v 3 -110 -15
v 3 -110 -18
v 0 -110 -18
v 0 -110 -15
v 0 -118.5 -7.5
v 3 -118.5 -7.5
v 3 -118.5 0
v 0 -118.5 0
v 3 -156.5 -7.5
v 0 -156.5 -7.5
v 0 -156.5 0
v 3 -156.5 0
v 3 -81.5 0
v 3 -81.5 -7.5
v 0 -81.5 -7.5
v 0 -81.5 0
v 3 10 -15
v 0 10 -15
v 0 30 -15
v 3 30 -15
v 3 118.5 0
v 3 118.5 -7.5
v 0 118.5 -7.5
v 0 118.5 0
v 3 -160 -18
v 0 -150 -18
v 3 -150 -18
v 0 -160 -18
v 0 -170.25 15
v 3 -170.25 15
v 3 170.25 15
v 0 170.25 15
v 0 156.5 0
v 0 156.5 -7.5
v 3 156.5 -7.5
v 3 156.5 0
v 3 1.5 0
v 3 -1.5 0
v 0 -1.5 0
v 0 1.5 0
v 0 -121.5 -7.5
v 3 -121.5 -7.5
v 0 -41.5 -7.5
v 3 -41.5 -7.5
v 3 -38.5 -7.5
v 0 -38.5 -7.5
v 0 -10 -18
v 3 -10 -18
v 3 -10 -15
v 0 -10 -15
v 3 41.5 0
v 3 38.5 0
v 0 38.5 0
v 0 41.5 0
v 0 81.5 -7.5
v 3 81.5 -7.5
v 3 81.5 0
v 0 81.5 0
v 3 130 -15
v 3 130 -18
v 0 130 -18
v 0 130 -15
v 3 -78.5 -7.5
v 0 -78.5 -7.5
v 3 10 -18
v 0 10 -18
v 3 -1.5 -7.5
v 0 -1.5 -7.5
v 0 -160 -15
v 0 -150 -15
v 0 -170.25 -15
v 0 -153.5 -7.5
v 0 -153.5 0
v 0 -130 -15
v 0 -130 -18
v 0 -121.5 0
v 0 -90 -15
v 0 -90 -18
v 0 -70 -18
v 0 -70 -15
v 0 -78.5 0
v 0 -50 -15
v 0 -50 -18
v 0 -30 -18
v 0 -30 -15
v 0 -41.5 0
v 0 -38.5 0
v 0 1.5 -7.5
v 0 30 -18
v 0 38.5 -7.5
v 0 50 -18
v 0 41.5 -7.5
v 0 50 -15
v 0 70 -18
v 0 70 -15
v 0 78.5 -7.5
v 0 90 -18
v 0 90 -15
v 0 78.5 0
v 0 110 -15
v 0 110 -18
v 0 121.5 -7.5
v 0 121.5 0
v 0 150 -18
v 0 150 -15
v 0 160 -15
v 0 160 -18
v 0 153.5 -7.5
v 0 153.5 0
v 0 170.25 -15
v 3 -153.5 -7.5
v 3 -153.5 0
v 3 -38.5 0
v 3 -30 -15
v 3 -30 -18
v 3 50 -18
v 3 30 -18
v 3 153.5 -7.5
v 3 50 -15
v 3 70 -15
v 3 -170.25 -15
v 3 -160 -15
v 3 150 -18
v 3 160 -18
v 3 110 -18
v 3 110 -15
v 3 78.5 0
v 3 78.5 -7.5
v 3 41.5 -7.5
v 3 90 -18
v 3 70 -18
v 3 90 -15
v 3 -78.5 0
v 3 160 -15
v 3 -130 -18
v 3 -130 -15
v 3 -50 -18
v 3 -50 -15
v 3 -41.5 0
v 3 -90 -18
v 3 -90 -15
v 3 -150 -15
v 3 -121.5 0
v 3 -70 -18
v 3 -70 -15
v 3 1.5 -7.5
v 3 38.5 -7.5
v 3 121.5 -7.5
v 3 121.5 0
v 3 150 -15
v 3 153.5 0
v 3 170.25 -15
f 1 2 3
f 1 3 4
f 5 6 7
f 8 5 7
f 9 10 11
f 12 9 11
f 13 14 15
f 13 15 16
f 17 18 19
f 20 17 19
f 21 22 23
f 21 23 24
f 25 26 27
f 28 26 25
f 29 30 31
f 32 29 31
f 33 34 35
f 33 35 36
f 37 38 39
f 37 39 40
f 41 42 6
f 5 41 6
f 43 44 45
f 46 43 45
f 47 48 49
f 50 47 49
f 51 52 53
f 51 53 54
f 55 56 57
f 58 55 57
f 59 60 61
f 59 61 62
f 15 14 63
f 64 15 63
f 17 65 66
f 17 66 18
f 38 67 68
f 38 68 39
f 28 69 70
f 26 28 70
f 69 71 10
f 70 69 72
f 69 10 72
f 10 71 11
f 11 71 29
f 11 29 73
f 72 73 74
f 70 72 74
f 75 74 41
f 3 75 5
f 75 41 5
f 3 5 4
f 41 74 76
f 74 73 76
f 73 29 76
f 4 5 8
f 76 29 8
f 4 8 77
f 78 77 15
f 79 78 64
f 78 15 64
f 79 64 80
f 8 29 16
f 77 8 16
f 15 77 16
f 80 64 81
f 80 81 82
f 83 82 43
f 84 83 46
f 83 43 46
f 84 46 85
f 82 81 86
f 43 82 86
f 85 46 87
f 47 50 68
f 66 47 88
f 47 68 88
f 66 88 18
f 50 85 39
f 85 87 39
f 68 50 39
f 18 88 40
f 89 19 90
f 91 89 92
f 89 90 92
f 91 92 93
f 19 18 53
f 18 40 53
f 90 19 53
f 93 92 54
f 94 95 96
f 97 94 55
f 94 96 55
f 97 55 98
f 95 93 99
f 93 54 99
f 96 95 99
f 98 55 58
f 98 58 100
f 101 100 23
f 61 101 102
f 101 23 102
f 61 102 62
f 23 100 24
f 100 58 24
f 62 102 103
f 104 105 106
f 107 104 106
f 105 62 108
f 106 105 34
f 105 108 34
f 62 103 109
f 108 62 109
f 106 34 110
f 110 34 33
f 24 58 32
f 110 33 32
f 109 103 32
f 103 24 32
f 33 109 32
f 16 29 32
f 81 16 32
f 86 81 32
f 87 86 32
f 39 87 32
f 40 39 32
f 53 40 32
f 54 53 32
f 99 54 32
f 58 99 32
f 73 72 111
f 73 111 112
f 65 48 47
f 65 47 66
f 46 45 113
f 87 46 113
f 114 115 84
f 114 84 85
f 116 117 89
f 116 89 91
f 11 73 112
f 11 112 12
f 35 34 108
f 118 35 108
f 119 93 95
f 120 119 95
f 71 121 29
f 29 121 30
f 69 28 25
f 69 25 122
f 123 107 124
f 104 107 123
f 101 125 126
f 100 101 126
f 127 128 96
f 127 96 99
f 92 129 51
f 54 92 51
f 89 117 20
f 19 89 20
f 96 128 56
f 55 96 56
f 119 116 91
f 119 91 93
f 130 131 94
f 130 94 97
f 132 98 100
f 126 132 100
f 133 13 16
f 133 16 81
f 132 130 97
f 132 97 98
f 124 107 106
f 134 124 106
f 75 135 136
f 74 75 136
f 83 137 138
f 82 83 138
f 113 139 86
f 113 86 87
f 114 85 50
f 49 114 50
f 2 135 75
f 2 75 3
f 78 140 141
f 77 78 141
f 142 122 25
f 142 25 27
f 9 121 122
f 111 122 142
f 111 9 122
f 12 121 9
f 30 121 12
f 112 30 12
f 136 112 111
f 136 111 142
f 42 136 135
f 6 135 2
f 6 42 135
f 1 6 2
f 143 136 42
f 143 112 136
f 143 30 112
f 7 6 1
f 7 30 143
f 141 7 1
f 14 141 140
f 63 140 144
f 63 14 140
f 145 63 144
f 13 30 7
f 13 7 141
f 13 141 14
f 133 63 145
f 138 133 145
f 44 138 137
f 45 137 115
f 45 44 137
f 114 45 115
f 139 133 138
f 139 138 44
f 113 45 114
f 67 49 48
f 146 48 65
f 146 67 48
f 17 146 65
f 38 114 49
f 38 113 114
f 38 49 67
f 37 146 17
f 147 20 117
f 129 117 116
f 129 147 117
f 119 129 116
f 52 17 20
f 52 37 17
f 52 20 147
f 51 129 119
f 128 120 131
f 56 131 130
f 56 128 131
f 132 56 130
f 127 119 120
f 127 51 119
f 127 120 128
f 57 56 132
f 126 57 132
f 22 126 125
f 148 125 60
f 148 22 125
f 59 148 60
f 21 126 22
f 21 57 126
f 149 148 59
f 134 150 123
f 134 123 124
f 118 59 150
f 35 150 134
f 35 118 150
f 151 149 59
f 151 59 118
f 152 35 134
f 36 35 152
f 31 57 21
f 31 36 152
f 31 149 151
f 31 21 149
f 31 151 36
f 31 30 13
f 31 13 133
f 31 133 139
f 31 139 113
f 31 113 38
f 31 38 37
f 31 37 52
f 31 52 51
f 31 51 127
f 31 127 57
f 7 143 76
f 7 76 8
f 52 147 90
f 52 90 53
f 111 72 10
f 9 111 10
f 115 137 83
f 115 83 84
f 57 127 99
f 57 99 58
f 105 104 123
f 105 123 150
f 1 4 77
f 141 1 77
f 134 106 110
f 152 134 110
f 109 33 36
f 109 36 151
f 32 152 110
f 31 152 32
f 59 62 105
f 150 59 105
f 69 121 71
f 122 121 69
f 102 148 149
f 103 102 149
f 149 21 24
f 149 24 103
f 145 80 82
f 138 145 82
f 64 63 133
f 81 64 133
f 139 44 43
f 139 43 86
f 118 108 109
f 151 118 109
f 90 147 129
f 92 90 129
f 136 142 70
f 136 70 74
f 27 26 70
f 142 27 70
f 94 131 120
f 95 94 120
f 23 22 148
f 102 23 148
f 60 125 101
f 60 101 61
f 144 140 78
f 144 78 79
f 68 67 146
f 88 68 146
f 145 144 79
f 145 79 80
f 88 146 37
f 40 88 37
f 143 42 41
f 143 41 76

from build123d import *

# Parameters (mm, degrees)
F0_W      = 280
F0_H      = 30
F1_DEPTH  = 3
F2_W      = 20
F2_H      = 3
F3_DEPTH  = 3
F4_W      = 3
F4_H      = 7.5
F5_DEPTH  = 25
F6_W      = 30.25
F6_H      = 30
F7_DEPTH  = 3
F8_W      = 10
F8_H      = 3
F9_DEPTH  = 3
F10_W     = 3
F10_H     = 7.5
F11_DEPTH = 25


with BuildPart() as f1:
    # F0 (on Right) → F1 (new body)
    with BuildSketch(Plane.YZ):
        Rectangle(F0_W, F0_H)
    extrude(amount=F1_DEPTH)

    # F2 (on face) → F3 (join, through all)
    with BuildSketch(Plane.YZ.offset(3)):
        with Locations((120, -16.5)):
            Rectangle(F2_W, F2_H)
        with Locations((80, -16.5)):
            Rectangle(F2_W, F2_H)
        with Locations((40, -16.5)):
            Rectangle(F2_W, F2_H)
        with Locations((0, -16.5)):
            Rectangle(F2_W, F2_H)
        with Locations((-40, -16.5)):
            Rectangle(F2_W, F2_H)
        with Locations((-80, -16.5)):
            Rectangle(F2_W, F2_H)
        with Locations((-120, -16.5)):
            Rectangle(F2_W, F2_H)
    extrude(amount=-F3_DEPTH)

    # F4 (on face) → F5 (cut)
    with BuildSketch(Plane.YZ.offset(3)):
        with Locations((120, -3.75)):
            Rectangle(F4_W, F4_H)
        with Locations((80, -3.75)):
            Rectangle(F4_W, F4_H)
        with Locations((40, -3.75)):
            Rectangle(F4_W, F4_H)
        with Locations((0, -3.75)):
            Rectangle(F4_W, F4_H)
        with Locations((-40, -3.75)):
            Rectangle(F4_W, F4_H)
        with Locations((-80, -3.75)):
            Rectangle(F4_W, F4_H)
        with Locations((-120, -3.75)):
            Rectangle(F4_W, F4_H)
    extrude(amount=-F5_DEPTH, mode=Mode.SUBTRACT)

    # F6 (on face) → F7 (join)
    with BuildSketch(Plane.YZ.offset(3)):
        with Locations((-155.125, 0)):
            Rectangle(F6_W, F6_H)
        with Locations((155.125, 0)):
            Rectangle(F6_W, F6_H)
    extrude(amount=-F7_DEPTH)

    # F8 (on face) → F9 (join)
    with BuildSketch(Plane(origin=(0, 0, 0), x_dir=(0, -1, 0), z_dir=(-1, 0, 0))):
        with Locations((-155, -16.5)):
            Rectangle(F8_W, F8_H)
        with Locations((155, -16.5)):
            Rectangle(F8_W, F8_H)
    extrude(amount=-F9_DEPTH)

    # F10 (on face) → F11 (cut)
    with BuildSketch(Plane(origin=(0, 0, 0), x_dir=(0, -1, 0), z_dir=(-1, 0, 0))):
        with Locations((-155, -3.75)):
            Rectangle(F10_W, F10_H)
        with Locations((155, -3.75)):
            Rectangle(F10_W, F10_H)
    extrude(amount=-F11_DEPTH, mode=Mode.SUBTRACT)


solid = f1.part
